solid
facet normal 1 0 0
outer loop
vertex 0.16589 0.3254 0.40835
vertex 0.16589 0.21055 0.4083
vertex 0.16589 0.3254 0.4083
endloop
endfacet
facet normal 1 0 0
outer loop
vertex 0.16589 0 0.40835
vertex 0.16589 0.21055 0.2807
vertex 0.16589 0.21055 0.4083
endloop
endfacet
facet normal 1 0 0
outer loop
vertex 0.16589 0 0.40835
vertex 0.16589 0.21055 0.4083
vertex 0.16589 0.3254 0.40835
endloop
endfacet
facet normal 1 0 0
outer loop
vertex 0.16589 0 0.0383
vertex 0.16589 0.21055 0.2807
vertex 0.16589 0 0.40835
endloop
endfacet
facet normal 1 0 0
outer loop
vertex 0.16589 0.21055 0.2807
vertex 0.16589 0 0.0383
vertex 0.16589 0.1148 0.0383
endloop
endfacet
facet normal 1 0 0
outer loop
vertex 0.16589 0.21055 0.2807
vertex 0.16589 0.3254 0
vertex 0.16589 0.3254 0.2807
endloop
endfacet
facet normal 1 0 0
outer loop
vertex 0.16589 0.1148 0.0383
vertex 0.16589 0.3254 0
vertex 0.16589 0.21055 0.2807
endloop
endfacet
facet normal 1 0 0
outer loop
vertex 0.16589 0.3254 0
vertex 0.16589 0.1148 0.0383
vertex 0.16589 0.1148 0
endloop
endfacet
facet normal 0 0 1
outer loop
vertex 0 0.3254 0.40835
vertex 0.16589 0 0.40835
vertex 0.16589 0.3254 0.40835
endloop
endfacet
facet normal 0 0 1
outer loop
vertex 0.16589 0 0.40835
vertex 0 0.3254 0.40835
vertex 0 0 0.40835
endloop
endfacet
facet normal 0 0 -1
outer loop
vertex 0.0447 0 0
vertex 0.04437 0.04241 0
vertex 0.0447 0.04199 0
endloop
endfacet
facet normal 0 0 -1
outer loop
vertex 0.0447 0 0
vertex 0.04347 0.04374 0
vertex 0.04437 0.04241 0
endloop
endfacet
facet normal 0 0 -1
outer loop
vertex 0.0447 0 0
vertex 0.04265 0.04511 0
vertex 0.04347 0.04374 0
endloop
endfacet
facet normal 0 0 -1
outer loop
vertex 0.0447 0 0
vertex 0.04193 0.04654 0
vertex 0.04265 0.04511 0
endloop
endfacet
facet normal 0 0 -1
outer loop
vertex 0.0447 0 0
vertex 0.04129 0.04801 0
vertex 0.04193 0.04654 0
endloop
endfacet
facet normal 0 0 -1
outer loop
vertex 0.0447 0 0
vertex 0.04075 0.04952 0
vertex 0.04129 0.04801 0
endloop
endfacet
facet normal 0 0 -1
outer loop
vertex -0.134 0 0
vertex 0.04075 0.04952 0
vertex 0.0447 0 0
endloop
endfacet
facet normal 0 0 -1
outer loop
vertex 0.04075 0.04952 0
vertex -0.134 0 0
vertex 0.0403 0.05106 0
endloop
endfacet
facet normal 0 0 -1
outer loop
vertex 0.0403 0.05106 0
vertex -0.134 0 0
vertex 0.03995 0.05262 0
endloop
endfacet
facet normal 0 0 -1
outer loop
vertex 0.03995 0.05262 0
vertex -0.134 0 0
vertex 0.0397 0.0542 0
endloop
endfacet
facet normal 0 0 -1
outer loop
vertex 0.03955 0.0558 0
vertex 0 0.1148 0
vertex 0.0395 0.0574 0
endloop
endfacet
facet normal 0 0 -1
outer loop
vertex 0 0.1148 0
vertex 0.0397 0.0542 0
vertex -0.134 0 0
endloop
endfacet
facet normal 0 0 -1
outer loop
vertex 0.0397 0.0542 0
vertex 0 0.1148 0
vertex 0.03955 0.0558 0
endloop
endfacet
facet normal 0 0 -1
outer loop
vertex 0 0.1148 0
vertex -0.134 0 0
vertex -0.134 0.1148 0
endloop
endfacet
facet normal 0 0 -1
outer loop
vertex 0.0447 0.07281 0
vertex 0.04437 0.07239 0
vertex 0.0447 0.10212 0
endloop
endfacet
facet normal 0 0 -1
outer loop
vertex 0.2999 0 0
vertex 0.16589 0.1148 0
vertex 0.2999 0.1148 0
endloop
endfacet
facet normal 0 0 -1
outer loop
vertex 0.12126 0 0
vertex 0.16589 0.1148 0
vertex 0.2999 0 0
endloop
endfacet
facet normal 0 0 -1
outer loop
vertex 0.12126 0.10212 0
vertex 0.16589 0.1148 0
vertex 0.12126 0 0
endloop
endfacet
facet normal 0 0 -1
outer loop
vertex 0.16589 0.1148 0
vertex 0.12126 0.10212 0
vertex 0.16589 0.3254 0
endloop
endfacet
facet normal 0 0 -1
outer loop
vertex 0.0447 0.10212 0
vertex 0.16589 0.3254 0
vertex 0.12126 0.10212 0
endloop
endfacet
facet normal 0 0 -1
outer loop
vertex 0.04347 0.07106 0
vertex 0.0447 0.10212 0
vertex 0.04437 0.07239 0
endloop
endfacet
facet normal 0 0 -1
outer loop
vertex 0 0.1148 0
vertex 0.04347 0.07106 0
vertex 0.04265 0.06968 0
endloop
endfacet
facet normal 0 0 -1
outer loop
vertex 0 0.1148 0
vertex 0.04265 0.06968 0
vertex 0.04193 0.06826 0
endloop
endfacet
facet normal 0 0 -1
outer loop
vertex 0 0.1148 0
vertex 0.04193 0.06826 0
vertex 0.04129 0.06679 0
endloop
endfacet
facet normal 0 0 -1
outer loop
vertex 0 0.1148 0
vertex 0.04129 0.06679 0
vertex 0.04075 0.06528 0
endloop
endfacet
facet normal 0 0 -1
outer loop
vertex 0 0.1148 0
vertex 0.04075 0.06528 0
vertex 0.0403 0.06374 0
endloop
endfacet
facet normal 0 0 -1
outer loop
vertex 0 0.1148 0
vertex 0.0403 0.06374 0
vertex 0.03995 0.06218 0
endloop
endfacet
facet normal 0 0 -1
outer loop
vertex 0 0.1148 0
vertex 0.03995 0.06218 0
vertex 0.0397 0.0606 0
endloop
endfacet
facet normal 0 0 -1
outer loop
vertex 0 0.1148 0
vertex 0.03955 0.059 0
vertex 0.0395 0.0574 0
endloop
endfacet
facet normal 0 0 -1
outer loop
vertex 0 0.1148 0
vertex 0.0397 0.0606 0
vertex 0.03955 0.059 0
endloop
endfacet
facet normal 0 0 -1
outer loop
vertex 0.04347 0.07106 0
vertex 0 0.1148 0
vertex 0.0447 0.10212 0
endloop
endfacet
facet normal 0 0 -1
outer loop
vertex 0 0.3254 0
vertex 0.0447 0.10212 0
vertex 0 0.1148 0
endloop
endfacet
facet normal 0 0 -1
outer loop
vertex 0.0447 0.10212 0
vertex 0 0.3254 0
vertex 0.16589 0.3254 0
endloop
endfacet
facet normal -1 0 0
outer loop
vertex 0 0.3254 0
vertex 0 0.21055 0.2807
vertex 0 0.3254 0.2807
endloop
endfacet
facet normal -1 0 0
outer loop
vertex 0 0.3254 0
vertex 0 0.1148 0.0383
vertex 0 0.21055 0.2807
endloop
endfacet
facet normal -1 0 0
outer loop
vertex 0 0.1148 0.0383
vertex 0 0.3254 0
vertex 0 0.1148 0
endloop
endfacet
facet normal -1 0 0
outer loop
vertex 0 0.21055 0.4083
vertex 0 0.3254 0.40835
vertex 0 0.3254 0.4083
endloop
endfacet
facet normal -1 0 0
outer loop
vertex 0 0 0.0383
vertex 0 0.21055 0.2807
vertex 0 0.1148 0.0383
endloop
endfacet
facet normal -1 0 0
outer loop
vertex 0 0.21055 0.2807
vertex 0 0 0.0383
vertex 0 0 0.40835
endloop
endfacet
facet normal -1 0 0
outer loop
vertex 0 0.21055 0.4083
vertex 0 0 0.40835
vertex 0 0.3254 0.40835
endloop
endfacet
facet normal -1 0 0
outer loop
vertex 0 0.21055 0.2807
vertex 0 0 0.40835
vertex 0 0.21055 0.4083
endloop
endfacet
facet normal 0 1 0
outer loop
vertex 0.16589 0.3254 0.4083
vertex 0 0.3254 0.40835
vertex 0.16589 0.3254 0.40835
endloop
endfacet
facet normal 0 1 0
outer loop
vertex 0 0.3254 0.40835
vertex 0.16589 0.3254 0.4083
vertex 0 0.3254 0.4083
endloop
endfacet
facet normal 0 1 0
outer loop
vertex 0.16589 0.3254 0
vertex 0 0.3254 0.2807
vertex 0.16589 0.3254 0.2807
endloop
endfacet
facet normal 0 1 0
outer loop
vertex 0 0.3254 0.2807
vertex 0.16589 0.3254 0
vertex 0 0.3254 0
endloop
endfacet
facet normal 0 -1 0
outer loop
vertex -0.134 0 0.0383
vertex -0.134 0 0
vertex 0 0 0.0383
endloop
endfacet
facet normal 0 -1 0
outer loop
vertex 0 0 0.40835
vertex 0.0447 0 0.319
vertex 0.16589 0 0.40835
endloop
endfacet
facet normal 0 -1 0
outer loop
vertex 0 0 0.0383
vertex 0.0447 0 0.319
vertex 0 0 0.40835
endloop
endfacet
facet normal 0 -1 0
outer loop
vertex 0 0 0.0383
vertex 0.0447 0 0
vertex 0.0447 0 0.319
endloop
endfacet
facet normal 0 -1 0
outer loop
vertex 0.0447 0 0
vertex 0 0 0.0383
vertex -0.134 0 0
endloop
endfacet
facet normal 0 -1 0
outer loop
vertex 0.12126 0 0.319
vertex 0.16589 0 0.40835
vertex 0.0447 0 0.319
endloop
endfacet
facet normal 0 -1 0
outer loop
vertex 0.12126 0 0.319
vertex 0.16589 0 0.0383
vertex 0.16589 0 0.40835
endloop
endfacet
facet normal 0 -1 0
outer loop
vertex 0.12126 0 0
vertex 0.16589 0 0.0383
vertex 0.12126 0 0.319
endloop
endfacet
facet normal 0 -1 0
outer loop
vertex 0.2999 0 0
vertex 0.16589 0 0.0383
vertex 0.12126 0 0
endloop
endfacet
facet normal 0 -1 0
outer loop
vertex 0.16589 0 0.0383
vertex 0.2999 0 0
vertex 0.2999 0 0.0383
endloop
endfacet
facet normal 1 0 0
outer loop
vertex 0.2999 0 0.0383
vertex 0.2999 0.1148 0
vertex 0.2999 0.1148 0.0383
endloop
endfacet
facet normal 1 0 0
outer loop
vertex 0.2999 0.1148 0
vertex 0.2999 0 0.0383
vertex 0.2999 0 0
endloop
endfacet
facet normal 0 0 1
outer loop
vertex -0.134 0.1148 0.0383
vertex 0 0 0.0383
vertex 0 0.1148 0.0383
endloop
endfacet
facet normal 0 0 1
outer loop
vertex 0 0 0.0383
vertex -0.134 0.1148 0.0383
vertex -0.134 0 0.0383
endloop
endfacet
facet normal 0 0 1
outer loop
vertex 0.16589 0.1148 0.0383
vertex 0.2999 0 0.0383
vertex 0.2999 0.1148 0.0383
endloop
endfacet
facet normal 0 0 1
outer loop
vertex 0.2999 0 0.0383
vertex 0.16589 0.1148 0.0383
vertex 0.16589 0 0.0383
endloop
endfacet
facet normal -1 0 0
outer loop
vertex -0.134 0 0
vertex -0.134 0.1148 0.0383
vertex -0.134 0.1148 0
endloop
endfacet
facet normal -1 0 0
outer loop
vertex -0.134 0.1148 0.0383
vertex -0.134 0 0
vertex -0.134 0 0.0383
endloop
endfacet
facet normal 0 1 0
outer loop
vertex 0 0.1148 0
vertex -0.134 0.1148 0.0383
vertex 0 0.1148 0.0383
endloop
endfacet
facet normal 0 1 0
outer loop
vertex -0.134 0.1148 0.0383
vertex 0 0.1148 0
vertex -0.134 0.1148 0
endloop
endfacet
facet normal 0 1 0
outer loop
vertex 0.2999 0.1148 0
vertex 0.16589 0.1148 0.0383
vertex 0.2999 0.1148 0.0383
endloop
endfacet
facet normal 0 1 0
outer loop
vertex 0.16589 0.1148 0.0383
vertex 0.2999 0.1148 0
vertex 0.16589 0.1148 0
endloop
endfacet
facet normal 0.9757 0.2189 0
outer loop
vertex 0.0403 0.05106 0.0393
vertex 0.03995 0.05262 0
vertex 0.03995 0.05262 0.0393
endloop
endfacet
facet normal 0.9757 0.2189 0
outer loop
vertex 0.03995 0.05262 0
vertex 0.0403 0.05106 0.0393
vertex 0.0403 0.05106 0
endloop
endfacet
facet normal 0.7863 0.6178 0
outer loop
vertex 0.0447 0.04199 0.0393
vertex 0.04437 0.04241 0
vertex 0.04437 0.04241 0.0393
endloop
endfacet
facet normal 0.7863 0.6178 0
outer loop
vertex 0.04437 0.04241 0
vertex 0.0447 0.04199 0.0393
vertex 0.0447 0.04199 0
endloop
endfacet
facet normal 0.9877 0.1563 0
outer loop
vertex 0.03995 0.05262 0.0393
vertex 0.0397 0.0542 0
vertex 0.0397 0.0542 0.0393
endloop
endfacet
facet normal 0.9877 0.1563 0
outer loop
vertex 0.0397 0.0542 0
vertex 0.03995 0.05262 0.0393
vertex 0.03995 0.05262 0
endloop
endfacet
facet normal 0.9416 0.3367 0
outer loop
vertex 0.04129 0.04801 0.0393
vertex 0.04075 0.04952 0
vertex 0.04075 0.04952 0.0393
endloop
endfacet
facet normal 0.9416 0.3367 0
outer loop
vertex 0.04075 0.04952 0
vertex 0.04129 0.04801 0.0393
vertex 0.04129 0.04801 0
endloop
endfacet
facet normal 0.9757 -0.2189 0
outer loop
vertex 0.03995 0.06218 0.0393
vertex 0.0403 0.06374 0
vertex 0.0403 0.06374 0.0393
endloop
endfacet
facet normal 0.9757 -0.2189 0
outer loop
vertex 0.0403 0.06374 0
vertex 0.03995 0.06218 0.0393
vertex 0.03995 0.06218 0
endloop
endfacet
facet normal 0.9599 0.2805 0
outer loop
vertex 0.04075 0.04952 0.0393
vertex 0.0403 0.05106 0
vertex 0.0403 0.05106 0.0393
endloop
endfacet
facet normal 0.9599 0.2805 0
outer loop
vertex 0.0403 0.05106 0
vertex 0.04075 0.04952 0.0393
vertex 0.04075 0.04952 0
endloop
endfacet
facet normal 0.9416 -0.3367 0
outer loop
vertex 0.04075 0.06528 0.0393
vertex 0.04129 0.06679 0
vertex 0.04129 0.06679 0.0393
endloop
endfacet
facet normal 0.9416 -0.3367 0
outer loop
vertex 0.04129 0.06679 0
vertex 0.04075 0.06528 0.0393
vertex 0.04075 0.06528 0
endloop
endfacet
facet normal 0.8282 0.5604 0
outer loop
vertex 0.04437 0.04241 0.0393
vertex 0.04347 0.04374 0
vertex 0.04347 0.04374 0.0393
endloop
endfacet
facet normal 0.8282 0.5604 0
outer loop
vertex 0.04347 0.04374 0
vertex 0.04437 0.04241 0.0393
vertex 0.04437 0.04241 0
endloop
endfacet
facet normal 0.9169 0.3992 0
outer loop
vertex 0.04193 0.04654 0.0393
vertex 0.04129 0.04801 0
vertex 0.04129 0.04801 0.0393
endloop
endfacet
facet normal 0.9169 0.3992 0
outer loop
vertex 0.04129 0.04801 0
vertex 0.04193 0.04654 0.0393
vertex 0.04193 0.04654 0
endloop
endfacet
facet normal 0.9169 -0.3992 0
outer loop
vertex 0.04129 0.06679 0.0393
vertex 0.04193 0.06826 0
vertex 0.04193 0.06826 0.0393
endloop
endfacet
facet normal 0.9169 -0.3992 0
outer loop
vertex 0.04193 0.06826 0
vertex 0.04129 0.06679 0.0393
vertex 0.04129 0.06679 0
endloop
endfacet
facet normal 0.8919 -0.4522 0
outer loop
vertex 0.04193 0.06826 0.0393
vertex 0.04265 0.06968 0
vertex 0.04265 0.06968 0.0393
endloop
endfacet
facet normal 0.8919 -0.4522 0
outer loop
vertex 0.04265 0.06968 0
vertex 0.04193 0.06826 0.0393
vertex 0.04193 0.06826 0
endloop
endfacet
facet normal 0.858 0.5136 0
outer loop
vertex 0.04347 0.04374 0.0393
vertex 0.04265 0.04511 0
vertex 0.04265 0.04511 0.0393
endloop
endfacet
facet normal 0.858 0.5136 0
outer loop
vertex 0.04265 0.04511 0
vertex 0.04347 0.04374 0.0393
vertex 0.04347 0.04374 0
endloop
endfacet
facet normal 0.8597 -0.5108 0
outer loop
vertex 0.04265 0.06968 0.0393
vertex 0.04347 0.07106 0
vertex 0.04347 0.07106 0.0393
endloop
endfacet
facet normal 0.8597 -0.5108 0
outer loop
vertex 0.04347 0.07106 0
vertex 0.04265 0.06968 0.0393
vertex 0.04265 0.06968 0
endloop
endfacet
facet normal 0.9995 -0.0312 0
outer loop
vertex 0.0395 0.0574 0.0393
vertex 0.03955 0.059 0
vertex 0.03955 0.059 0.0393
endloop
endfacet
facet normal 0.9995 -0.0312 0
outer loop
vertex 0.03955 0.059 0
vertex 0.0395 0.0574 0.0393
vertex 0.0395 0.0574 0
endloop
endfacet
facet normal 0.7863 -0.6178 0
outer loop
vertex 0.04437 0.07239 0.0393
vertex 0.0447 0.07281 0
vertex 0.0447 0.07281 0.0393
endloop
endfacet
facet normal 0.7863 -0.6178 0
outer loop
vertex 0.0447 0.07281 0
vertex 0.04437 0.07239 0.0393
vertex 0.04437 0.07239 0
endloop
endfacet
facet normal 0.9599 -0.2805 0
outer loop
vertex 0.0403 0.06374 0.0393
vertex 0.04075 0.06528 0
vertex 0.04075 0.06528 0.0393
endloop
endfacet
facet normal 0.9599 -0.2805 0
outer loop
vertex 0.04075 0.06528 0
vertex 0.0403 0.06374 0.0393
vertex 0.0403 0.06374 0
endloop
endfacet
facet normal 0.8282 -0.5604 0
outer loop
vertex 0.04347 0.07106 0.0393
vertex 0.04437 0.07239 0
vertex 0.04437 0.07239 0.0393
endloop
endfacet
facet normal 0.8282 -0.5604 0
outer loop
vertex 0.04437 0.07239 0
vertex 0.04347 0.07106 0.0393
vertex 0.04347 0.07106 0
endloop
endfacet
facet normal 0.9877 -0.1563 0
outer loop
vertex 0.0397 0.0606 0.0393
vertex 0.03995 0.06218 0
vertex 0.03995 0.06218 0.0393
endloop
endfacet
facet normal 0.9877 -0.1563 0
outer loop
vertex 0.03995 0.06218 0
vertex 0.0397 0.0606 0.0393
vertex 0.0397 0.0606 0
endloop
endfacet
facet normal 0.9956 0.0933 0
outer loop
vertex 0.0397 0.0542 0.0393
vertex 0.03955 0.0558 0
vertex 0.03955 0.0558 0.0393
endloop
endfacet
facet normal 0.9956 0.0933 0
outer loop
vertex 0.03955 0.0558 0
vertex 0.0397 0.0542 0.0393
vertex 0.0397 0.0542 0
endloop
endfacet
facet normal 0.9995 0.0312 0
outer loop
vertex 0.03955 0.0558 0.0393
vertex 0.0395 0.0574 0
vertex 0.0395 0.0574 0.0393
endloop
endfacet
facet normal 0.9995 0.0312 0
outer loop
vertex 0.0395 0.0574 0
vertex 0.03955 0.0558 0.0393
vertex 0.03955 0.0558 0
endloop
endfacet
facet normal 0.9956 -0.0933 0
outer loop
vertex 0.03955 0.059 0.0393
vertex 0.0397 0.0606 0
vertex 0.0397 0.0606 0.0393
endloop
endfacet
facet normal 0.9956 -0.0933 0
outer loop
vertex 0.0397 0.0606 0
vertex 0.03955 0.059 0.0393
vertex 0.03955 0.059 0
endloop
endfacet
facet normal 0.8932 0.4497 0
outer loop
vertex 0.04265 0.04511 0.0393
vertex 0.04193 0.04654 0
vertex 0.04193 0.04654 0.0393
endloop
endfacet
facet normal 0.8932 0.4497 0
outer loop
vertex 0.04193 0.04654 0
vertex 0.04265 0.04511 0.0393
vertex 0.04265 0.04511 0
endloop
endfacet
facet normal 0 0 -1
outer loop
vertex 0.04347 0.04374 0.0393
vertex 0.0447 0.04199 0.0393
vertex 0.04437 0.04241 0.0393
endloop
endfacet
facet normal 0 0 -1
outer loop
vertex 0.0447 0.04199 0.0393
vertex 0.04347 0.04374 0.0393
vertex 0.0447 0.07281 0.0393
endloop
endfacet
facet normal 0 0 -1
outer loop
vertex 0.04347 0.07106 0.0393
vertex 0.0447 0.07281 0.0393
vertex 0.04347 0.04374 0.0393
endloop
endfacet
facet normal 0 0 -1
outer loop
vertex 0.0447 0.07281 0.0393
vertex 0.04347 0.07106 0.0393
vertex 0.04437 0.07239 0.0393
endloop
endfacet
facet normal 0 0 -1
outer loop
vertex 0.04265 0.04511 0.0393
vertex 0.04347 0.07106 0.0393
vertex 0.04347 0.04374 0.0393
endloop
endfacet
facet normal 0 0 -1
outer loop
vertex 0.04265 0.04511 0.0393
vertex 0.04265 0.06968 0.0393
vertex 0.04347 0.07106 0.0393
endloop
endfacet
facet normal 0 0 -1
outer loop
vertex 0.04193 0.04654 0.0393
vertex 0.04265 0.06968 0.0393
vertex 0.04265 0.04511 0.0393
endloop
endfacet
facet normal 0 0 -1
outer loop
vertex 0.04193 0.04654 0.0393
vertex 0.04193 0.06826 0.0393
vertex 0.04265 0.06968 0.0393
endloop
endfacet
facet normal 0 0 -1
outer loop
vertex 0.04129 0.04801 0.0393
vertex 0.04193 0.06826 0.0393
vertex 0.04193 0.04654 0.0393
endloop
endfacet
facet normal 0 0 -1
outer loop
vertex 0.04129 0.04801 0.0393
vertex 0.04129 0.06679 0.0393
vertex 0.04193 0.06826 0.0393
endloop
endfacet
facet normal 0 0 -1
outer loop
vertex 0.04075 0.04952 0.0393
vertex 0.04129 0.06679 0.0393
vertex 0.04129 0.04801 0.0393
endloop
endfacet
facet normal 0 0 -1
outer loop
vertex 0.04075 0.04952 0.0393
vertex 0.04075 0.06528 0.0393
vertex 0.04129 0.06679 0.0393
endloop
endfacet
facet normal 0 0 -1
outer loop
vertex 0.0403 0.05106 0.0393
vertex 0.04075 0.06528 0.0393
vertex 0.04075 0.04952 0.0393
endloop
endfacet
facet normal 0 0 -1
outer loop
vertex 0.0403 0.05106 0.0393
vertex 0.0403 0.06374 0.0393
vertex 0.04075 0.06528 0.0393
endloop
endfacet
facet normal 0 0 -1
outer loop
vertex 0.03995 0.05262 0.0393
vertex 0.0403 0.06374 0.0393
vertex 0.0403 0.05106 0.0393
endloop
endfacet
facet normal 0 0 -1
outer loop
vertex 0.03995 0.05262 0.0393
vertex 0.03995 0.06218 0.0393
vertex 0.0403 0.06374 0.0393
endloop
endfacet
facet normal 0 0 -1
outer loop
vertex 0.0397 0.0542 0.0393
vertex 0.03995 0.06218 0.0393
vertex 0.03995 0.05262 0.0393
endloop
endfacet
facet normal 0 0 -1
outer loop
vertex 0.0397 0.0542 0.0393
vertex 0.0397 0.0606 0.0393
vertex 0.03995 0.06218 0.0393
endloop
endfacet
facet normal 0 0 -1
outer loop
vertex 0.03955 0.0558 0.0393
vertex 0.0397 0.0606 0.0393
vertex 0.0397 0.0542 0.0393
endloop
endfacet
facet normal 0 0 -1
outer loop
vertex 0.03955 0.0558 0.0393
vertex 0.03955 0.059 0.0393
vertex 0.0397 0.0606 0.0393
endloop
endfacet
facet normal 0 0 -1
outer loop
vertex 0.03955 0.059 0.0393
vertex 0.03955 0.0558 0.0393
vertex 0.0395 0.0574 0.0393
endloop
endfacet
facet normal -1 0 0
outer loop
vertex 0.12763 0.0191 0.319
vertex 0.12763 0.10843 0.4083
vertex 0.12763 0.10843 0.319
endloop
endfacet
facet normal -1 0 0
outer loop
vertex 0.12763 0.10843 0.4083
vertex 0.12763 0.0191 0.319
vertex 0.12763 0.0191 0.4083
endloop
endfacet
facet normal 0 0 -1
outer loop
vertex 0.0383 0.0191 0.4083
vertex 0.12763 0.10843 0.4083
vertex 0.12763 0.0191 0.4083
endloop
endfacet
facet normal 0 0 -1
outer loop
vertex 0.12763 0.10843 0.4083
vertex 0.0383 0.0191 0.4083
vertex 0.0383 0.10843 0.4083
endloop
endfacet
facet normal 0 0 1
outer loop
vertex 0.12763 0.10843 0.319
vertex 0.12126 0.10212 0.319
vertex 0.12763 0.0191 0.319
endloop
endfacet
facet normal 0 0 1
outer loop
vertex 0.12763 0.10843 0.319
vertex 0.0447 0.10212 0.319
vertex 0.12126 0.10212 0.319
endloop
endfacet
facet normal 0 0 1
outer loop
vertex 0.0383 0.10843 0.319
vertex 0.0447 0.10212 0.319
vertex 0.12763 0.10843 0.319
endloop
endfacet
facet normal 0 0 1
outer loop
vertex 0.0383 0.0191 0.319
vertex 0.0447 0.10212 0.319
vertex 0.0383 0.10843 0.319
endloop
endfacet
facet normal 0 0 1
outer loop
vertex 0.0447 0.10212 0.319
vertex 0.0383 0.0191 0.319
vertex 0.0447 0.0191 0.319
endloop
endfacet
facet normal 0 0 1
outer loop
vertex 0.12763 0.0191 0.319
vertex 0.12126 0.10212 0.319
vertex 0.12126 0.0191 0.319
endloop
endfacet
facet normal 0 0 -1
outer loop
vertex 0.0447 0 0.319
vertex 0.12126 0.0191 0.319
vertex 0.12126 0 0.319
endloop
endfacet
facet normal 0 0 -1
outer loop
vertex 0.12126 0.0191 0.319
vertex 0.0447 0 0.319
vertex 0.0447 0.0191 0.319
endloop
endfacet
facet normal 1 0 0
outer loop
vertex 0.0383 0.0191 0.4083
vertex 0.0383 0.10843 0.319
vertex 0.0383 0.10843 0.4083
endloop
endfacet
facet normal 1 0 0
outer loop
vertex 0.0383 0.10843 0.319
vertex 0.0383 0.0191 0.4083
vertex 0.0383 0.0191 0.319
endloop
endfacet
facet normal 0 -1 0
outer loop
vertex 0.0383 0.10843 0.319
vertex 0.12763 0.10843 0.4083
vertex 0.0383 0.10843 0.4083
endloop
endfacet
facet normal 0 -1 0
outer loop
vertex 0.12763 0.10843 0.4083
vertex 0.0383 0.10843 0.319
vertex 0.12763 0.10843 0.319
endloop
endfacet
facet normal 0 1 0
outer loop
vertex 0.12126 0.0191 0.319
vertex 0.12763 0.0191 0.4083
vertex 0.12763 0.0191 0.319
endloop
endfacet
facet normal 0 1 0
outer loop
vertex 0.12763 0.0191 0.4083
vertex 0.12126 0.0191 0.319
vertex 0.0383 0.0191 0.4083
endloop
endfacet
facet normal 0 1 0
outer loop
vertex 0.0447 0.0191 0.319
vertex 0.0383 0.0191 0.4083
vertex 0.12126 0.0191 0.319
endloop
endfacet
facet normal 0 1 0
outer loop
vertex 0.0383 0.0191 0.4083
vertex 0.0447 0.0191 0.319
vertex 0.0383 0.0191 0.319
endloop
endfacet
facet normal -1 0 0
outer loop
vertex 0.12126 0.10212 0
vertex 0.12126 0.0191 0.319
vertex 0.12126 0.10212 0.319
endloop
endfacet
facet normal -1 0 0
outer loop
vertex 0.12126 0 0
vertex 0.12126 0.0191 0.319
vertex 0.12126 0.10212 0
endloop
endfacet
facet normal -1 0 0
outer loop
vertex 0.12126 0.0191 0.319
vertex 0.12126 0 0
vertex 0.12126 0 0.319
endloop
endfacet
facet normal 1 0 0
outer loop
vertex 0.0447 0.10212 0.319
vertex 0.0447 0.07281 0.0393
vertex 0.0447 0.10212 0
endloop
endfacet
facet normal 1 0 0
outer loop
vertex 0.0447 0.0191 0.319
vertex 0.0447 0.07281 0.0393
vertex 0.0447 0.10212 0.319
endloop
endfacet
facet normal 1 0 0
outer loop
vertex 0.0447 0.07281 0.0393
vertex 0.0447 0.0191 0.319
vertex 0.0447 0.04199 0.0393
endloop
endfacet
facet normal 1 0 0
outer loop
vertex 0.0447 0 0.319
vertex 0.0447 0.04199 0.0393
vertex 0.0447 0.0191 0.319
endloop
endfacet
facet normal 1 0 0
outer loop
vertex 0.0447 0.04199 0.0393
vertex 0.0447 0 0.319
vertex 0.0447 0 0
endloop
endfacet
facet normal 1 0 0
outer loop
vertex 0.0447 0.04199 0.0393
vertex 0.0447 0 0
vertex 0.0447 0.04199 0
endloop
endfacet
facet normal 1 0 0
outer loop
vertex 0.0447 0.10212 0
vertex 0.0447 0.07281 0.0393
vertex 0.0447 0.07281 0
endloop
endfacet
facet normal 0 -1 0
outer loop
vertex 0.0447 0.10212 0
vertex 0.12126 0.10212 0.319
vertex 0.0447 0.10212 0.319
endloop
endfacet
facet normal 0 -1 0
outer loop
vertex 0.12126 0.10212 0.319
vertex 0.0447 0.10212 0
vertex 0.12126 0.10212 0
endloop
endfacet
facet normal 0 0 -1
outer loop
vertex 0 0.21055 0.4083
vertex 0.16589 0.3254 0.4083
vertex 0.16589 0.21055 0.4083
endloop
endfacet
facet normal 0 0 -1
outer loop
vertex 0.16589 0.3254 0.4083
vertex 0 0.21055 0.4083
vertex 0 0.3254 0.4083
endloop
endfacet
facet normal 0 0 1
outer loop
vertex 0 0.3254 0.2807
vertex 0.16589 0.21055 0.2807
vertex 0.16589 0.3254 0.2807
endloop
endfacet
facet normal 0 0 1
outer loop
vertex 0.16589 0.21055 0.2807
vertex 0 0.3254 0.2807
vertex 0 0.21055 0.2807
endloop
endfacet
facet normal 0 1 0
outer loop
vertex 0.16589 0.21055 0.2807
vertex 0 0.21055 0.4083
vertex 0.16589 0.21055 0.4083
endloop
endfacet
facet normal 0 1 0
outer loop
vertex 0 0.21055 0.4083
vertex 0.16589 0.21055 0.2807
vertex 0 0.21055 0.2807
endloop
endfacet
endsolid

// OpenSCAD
// Main dimensions
length = 0.165891;
width = 0.325401;
height = 0.408347;
extrusion_depth = 0.4083;

// Square recess parameters
recess_size = 0.089326;
recess_left_offset = 0.0383;
recess_front_offset = 0.0191;
recess_back_offset = 0.217;
recess_top_z = 0.319;
recess_bottom_z = 0.4083;
recess_depth = 0.0893;

// Lower opening parameters
opening_width = 0.076565;
opening_height = 0.132416;
opening_left_offset = 0.0447;
opening_right_offset = 0.0446;
opening_front_offset = -0.0303;
opening_back_remaining = 0.2233;
opening_bottom_z = 0;
opening_top_z = 0.319;

// Upper back strip removal
strip_removal_start_z = 0.2807;
strip_removal_end_z = 0.4083;
strip_removal_depth = 0.1276;
strip_front_remaining = 0.2106;
strip_width = 0.114848;

// Shallow base section
shallow_height = 0.0383;
shallow_length = 0.4339;
shallow_width = 0.1148;
shallow_side_projection = 0.134;

// Circular openings in shallow section
opening_radius = 0.0255;
opening_front_offset_shallow = 0.0574;
opening1_left_offset = -0.069;
opening2_left_offset = 0.2349;

$fn = 100; // Smooth curves

// Main base
module main_base() {
    cube([length, width, height]);
}

// Square recess from top
module square_recess() {
    translate([
        recess_left_offset,
        recess_front_offset,
        recess_top_z
    ])
    cube([recess_size, recess_size, recess_depth]);
}

// Lower rectangular opening
module lower_opening() {
    translate([
        opening_left_offset,
        opening_front_offset,
        opening_bottom_z
    ])
    cube([opening_width, opening_height, opening_top_z - opening_bottom_z]);
}

// Upper back strip removal
module back_strip_removal() {
    translate([
        0,
        width - strip_width,
        strip_removal_start_z
    ])
    cube([length, strip_width, strip_removal_end_z - strip_removal_start_z]);
}

// Shallow base section
module shallow_section() {
    translate([
        -shallow_side_projection,
        0,
        0
    ])
    cube([shallow_length, shallow_width, shallow_height]);
}

// Circular openings in shallow section
module shallow_openings() {
    // First opening
    translate([
        opening1_left_offset + shallow_side_projection,
        opening_front_offset_shallow,
        -0.001
    ])
    cylinder(h = shallow_height + 0.002, r = opening_radius);
    
    // Second opening
    translate([
        opening2_left_offset + shallow_side_projection,
        opening_front_offset_shallow,
        -0.001
    ])
    cylinder(h = shallow_height + 0.002, r = opening_radius);
}

// Final assembly
difference() {
    union() {
        main_base();
        shallow_section();
    }
    
    // Subtractive operations
    square_recess();
    lower_opening();
    back_strip_removal();
    shallow_openings();
}
